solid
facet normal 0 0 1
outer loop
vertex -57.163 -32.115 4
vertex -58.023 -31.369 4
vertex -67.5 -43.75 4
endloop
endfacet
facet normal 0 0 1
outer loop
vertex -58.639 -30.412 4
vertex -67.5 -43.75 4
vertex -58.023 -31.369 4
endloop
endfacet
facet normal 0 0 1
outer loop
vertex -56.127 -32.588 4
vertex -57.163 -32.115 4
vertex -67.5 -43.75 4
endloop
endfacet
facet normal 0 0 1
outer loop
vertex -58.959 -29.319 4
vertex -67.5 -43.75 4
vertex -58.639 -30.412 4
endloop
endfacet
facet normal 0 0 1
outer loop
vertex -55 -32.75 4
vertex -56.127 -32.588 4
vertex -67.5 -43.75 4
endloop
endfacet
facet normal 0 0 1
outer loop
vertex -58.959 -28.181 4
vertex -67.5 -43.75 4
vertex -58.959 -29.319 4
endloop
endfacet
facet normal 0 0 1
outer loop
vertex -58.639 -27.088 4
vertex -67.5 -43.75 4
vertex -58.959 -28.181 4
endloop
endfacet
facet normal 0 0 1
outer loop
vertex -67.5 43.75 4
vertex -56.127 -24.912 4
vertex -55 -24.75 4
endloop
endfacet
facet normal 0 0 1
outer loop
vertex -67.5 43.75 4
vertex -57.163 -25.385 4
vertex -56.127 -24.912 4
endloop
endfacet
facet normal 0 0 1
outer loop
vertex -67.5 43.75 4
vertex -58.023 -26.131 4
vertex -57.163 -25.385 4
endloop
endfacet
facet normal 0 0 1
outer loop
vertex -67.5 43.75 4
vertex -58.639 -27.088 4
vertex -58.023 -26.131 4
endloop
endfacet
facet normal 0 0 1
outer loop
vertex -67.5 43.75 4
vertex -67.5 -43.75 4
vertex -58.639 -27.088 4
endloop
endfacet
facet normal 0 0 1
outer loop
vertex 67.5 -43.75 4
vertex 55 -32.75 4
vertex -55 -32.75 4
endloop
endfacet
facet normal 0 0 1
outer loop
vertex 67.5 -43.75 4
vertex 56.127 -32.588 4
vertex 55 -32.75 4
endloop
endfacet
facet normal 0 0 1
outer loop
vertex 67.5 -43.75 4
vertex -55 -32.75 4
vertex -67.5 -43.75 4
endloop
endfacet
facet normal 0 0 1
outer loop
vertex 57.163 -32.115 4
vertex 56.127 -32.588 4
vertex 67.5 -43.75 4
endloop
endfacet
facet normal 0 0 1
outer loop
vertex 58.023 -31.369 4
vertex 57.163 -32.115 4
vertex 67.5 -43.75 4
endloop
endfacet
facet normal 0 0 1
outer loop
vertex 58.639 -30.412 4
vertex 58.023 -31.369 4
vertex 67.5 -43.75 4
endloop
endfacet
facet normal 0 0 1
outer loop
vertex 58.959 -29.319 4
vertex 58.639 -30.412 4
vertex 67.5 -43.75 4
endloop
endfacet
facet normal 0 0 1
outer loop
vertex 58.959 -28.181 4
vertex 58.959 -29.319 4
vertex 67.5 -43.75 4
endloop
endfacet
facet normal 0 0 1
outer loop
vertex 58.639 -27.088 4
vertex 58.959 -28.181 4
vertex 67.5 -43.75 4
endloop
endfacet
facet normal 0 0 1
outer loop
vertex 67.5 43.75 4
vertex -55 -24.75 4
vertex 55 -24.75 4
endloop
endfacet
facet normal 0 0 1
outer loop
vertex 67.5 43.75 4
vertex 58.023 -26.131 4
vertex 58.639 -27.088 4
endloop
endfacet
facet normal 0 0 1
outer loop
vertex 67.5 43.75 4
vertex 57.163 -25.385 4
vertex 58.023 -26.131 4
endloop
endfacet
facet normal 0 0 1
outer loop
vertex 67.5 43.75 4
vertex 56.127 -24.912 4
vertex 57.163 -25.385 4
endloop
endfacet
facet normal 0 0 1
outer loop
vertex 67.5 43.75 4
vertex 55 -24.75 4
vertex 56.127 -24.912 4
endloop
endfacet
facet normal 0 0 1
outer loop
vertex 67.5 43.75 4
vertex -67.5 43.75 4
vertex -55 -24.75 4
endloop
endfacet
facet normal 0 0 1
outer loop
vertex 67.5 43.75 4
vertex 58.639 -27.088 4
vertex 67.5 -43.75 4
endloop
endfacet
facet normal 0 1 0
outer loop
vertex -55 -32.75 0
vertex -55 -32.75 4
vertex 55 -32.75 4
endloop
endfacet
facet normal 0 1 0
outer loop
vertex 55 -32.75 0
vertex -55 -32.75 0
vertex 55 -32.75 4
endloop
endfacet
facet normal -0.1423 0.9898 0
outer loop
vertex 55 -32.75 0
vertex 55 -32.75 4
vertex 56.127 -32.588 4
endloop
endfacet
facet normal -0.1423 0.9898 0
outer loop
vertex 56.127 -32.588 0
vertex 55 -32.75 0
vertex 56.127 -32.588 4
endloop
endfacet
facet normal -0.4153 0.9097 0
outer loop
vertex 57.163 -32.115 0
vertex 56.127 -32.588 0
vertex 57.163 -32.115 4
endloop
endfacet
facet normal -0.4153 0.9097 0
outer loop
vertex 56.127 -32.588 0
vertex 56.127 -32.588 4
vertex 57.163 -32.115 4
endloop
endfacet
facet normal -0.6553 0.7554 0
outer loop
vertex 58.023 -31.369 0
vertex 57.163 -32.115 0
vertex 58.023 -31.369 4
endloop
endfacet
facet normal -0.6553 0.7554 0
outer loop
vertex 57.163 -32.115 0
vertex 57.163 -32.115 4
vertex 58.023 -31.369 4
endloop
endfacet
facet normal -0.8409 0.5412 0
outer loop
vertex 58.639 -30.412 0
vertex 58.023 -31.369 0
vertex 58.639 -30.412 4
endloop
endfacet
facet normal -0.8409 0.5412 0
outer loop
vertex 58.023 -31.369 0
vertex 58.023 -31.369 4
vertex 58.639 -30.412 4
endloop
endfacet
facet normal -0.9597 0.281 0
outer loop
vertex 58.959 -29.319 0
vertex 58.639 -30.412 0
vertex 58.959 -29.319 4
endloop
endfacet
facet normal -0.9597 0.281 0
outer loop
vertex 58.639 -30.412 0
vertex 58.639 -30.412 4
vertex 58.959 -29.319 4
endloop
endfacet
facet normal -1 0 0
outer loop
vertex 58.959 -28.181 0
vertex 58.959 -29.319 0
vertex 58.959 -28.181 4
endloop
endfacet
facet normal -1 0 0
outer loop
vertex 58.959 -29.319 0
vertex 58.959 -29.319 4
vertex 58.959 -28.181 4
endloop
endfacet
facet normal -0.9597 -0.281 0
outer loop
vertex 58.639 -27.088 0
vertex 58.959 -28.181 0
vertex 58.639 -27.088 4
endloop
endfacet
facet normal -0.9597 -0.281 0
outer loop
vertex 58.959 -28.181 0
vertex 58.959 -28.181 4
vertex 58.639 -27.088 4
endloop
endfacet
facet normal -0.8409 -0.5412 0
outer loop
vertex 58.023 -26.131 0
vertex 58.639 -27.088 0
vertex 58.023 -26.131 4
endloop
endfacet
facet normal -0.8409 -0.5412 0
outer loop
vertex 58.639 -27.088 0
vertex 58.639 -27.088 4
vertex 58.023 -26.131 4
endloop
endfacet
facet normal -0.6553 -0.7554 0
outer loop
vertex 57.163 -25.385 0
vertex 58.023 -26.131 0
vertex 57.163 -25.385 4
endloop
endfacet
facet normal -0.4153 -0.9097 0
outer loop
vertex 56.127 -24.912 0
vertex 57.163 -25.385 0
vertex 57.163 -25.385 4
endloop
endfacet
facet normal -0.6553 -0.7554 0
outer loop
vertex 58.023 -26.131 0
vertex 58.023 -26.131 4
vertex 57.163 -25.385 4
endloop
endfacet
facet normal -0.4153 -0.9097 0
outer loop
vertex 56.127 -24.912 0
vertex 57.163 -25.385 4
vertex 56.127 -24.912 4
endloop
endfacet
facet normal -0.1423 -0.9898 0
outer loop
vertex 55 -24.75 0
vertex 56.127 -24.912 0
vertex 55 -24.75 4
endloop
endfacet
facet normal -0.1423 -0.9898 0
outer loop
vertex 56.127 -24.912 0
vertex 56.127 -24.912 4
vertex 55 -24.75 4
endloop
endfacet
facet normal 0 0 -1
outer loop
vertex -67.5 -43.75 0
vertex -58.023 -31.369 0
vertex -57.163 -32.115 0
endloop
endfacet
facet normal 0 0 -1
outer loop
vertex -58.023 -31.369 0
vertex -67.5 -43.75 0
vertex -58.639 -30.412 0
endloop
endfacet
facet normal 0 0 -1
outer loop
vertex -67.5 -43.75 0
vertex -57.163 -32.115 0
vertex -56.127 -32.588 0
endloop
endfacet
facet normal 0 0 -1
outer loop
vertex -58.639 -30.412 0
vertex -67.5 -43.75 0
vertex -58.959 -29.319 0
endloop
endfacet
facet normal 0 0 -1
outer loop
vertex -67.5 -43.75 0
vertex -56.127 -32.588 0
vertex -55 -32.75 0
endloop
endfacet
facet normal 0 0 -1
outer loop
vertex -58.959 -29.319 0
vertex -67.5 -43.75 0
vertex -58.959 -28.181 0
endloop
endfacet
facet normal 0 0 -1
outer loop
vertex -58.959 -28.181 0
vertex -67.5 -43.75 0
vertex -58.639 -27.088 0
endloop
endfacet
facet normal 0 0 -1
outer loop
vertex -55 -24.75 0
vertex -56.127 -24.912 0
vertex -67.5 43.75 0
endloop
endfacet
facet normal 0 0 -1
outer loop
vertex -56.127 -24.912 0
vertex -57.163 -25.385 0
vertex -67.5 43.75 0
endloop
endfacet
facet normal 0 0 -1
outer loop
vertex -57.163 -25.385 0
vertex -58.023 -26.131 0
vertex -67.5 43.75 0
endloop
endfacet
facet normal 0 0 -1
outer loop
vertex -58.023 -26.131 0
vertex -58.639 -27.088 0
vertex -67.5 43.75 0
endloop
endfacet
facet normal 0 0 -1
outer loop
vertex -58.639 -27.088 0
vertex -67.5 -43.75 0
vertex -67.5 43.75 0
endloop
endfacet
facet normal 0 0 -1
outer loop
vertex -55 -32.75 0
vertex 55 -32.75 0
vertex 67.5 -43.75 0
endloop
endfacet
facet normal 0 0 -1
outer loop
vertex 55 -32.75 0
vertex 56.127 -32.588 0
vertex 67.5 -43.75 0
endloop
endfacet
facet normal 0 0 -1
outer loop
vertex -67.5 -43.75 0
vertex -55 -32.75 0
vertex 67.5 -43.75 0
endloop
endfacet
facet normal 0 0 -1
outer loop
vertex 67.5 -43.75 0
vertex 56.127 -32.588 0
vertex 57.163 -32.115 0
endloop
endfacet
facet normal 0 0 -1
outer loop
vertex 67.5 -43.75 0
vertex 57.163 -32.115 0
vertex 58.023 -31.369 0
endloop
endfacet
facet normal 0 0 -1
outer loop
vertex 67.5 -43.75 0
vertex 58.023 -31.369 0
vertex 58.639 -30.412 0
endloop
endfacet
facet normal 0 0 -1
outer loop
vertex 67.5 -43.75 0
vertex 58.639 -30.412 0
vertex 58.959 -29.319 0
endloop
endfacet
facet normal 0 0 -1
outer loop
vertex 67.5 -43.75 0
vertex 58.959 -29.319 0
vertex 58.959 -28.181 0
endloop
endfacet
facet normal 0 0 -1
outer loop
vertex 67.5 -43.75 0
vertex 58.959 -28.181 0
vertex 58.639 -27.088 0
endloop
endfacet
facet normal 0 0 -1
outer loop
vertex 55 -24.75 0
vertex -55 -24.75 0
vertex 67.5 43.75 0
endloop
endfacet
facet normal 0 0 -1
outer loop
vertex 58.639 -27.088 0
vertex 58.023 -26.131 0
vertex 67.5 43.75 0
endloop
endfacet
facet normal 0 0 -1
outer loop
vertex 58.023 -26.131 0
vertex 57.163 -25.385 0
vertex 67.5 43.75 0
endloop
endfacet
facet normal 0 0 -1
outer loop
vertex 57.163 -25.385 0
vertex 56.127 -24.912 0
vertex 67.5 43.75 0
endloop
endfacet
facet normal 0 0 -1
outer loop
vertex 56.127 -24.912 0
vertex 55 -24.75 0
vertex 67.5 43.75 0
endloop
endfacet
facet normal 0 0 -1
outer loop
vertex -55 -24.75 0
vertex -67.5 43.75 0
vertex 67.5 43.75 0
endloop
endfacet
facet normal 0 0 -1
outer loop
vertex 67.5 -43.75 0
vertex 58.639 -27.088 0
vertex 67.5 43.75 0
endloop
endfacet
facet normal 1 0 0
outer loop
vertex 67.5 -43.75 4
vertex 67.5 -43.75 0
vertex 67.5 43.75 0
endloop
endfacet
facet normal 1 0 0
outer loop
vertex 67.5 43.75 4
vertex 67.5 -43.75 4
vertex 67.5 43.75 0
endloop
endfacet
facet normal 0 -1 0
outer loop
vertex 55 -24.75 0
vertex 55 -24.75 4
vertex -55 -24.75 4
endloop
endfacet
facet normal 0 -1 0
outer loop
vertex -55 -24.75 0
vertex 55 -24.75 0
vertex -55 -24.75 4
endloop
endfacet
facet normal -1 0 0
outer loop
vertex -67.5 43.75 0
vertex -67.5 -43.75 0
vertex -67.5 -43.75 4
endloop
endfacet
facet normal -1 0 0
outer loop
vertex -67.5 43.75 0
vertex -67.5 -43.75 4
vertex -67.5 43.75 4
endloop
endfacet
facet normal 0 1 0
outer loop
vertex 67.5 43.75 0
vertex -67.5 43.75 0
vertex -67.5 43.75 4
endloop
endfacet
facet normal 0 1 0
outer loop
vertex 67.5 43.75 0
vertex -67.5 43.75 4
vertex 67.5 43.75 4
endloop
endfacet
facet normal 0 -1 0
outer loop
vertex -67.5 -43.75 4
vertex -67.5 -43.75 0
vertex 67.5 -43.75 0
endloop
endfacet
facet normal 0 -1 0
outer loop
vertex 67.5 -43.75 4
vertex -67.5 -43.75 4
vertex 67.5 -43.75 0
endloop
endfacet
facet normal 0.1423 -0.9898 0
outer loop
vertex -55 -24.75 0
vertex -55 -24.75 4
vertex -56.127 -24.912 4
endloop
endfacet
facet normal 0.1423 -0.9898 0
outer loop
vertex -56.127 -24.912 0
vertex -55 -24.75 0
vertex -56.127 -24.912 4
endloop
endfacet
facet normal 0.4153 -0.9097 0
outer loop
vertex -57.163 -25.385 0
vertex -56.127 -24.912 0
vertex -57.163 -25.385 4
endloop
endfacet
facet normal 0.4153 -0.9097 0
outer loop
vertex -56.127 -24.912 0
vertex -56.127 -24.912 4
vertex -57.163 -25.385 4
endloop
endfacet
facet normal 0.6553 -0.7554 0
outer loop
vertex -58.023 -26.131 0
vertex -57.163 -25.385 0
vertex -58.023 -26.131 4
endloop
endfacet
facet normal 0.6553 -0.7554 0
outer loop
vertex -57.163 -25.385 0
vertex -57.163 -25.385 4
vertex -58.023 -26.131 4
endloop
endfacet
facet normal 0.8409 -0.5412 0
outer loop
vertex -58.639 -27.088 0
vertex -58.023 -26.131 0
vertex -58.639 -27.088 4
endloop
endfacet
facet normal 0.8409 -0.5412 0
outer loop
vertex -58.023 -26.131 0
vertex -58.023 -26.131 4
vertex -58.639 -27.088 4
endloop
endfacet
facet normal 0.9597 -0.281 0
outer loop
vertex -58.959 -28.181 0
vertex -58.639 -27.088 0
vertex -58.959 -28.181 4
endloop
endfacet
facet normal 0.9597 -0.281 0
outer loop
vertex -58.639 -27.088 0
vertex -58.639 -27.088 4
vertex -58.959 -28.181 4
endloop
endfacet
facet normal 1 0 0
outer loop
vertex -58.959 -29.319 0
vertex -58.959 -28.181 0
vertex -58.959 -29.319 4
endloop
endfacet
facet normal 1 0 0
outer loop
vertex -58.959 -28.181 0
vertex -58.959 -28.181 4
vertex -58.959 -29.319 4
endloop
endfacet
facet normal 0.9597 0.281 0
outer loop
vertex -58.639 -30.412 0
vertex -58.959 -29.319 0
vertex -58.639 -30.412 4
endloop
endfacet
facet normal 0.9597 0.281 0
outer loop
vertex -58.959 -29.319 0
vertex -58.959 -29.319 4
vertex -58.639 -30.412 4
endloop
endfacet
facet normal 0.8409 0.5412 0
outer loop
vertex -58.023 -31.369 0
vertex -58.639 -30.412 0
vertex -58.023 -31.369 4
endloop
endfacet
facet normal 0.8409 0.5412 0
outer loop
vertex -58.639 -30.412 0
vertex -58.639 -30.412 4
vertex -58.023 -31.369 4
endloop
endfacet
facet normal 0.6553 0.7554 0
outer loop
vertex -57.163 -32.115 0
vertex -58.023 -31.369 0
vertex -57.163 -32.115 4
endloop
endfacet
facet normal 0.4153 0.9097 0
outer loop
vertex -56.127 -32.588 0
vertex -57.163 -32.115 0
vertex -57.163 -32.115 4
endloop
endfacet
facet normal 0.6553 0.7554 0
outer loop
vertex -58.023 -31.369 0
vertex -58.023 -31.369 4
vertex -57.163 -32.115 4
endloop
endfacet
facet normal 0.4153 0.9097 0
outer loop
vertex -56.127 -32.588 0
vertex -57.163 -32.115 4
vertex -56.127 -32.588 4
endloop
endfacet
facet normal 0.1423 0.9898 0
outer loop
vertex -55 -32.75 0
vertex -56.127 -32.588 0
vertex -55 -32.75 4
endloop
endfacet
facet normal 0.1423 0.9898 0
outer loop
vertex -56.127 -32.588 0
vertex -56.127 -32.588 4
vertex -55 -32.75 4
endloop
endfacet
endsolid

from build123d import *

# Parameters (mm, degrees)
F0_W     = 135
F0_H     = 87.5
F1_DEPTH = 4
F3_DEPTH = 25


with BuildPart() as f1:
    # F0 (on Top) → F1 (new body)
    with BuildSketch(Plane.XY):
        Rectangle(F0_W, F0_H)
    extrude(amount=F1_DEPTH)

    # F2 (on face) → F3 (cut)
    with BuildSketch(Plane.XY.offset(4)):
        with BuildLine():
            Line((-55, -32.749999), (55, -32.749999))
            ThreePointArc((55, -32.749999), (58.999999, -28.75), (55, -24.750001))
            Line((55, -24.750001), (-55, -24.750001))
            ThreePointArc((-55, -24.750001), (-58.999999, -28.75), (-55, -32.749999))
        make_face()
    extrude(amount=-F3_DEPTH, mode=Mode.SUBTRACT)


solid = f1.part
